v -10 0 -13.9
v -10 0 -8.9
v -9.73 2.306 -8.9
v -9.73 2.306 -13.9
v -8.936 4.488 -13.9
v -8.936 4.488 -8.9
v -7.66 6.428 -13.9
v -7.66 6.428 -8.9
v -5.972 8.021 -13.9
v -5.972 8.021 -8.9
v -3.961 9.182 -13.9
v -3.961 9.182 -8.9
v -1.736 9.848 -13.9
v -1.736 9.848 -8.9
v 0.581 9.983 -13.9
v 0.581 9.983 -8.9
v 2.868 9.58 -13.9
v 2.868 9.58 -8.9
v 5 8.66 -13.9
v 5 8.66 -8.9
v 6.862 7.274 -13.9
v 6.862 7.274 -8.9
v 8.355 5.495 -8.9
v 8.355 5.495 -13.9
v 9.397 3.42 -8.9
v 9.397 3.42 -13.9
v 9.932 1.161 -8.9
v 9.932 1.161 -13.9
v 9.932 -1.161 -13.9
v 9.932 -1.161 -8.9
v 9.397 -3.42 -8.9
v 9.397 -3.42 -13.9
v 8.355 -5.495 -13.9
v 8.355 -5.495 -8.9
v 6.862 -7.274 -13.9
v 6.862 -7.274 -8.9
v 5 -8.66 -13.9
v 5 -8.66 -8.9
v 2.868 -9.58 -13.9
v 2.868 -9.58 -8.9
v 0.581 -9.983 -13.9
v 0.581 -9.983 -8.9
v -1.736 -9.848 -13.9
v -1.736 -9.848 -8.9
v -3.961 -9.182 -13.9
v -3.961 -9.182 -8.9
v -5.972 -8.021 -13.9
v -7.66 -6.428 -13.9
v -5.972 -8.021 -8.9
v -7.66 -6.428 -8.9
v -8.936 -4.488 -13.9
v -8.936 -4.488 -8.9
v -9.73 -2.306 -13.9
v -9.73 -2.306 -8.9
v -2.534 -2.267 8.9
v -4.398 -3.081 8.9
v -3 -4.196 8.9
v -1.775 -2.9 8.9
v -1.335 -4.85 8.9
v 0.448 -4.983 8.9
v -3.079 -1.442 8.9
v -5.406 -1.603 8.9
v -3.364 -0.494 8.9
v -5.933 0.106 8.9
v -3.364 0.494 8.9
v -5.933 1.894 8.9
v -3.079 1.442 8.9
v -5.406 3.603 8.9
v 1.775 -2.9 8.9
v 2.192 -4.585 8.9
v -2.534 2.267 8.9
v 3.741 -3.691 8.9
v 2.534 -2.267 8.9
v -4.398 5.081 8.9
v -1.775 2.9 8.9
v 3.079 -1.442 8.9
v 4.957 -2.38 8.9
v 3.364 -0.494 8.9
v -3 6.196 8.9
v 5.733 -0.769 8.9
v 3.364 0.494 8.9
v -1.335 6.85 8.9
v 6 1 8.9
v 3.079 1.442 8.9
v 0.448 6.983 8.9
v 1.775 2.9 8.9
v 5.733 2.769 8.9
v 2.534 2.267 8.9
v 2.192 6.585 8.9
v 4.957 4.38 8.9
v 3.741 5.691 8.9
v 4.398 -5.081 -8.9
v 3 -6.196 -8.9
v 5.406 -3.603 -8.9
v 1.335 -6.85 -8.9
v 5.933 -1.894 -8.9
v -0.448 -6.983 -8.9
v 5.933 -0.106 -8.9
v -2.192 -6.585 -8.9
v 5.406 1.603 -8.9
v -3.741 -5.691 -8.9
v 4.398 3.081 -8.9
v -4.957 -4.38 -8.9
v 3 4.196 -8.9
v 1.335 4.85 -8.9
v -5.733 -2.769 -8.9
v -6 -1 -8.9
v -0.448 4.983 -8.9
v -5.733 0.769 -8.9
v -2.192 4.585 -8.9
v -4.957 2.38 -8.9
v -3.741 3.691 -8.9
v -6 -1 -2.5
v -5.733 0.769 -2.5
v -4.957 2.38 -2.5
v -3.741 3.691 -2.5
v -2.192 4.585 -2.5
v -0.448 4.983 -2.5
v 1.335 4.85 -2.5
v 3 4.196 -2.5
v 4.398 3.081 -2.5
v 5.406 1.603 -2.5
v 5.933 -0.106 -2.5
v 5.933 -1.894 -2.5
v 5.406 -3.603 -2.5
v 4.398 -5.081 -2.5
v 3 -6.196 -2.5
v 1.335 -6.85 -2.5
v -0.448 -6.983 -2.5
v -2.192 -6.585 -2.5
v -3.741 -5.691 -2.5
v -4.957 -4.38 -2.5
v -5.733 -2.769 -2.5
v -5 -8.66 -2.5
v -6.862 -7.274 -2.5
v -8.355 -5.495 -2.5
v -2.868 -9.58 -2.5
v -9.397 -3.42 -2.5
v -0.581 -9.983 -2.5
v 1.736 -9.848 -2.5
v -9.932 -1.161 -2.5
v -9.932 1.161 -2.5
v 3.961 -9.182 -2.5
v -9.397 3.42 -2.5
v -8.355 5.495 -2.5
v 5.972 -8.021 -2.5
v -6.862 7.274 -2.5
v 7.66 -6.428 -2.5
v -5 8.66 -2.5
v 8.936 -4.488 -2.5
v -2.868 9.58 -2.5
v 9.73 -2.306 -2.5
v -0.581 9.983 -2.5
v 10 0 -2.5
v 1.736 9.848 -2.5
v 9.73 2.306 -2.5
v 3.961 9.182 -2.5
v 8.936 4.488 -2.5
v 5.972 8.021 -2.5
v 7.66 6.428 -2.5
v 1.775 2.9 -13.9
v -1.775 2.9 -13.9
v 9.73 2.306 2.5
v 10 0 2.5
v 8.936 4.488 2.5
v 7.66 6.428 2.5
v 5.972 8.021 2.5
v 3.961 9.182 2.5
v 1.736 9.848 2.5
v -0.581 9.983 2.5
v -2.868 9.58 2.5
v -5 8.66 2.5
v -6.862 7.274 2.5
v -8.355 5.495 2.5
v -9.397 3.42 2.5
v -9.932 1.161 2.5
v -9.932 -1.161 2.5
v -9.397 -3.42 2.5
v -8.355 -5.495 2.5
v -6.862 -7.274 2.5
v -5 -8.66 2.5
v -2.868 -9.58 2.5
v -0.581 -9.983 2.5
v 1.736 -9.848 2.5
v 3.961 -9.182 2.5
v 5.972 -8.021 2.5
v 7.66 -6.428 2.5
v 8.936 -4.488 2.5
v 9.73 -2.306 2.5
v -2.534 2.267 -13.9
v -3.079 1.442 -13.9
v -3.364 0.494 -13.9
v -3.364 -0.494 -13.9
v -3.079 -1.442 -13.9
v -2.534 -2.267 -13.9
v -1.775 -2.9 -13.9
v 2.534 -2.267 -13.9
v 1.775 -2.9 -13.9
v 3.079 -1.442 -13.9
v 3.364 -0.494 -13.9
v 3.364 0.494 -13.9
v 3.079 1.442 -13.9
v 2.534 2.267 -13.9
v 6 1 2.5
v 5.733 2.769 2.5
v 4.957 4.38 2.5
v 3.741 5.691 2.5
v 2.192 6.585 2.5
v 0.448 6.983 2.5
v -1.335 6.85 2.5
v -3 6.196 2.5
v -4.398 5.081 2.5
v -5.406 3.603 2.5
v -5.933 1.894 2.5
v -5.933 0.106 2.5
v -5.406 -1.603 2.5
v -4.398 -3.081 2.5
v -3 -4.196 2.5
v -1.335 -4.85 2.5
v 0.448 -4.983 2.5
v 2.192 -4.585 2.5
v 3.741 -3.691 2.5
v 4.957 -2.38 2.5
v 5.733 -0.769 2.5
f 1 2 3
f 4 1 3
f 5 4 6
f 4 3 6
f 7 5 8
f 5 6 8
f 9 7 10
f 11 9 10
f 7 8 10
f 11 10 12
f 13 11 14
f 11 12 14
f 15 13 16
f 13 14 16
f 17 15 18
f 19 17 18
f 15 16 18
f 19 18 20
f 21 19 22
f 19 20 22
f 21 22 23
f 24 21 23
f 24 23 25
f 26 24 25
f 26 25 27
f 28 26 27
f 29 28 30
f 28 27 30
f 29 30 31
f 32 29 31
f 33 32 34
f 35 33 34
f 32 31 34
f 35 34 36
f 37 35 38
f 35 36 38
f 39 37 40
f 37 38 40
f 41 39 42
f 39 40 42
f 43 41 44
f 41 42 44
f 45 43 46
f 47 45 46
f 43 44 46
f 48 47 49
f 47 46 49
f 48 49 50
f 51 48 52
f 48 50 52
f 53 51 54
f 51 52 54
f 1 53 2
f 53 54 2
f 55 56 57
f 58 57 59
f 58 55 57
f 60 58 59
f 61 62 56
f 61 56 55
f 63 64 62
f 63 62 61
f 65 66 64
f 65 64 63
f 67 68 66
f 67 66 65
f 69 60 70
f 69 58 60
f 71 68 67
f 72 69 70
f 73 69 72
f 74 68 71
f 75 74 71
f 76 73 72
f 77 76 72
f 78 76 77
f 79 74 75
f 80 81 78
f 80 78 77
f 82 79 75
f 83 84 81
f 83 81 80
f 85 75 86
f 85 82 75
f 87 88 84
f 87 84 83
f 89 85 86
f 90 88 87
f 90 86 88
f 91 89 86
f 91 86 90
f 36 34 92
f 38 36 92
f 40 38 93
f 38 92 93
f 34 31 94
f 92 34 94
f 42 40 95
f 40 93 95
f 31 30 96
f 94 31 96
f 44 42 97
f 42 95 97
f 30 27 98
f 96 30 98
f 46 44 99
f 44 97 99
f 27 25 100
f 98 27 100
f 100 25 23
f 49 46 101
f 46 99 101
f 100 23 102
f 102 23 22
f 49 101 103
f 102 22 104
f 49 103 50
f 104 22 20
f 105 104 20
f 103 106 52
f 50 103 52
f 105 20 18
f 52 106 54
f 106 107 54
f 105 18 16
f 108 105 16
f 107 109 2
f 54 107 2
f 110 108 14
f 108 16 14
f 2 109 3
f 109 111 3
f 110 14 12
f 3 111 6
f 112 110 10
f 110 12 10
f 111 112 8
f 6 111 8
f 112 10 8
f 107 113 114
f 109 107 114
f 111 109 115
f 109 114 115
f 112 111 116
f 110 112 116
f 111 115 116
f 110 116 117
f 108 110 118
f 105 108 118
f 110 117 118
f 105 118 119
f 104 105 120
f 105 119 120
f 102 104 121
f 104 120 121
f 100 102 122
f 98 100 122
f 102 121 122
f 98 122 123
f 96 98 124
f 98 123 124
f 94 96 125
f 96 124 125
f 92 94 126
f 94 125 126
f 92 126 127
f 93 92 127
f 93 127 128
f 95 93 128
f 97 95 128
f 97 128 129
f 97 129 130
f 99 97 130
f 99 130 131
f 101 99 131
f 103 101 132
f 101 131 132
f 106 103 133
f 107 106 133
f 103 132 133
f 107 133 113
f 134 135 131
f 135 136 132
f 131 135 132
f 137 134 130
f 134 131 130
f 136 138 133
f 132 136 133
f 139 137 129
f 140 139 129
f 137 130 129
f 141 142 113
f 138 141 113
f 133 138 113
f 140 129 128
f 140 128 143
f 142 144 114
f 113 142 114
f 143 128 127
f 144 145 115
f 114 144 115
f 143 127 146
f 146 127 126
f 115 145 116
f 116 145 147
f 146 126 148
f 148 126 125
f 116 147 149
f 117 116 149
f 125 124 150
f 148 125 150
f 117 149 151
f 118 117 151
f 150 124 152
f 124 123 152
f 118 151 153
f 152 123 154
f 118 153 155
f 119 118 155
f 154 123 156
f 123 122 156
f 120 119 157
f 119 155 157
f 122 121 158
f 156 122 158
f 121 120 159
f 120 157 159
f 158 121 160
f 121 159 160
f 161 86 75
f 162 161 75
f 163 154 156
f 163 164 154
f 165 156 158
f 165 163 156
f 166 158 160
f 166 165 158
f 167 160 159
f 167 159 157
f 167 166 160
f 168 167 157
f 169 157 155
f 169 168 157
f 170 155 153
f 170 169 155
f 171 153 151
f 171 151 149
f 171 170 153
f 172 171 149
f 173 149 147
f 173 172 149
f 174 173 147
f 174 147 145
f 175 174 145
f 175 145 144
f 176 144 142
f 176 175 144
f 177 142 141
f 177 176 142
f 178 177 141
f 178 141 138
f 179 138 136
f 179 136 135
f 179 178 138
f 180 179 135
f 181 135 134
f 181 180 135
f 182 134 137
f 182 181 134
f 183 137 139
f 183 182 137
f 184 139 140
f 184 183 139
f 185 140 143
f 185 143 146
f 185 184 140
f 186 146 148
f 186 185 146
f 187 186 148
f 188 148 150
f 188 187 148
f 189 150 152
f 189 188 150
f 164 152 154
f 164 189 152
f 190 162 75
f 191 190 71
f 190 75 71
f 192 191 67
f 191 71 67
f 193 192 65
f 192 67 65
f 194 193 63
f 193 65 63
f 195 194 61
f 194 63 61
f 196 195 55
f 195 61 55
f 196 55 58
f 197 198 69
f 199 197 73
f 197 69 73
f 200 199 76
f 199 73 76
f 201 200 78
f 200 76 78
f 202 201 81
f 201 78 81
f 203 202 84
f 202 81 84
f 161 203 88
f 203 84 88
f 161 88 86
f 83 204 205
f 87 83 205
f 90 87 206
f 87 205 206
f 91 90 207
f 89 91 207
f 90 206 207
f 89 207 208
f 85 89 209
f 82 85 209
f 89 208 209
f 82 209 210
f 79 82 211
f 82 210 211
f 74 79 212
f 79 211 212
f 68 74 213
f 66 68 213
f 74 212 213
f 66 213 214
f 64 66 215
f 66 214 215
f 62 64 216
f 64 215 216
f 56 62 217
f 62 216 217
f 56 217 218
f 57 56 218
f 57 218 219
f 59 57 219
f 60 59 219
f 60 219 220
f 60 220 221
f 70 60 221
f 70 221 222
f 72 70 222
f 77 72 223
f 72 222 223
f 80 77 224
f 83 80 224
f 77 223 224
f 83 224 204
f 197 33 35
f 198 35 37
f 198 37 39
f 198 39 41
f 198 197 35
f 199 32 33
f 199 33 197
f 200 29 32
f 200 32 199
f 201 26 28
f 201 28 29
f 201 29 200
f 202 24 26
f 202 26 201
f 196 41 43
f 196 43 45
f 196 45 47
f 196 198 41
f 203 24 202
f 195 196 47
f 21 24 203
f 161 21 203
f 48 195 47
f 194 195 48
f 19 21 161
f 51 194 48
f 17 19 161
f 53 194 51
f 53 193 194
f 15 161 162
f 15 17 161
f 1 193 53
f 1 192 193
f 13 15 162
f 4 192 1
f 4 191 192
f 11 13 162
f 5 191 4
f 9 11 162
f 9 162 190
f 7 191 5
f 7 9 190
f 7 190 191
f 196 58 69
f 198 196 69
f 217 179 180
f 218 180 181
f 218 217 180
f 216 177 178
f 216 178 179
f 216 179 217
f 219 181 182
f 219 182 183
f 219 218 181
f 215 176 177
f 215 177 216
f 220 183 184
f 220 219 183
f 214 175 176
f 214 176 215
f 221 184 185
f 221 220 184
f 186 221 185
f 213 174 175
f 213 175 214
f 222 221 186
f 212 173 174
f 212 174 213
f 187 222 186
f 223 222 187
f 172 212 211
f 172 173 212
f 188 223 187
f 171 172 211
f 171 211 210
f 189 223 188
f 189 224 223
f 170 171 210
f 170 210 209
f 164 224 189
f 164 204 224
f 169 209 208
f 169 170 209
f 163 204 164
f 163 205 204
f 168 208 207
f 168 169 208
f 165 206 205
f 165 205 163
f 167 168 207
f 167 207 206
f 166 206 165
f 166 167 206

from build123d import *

# Parameters (mm, degrees)
SKETCH6_R               = 10
BOSS_EXTRUDE4_DEPTH     = 2.5
SKETCH7_R               = 6
BOSS_EXTRUDE5_DEPTH     = 6.4
SKETCH8_R               = 6
BOSS_EXTRUDE6_DEPTH     = 6.4
SKETCH12_R              = 10
BOSS_EXTRUDE8_DEPTH     = 5
CUT_EXTRUDE1_DEPTH      = 7.4
CUT_EXTRUDE1_DEPTH_BACK = 17.4


with BuildPart() as part:
    # Sketch6 → Boss-Extrude4 (new body, symmetric)
    with BuildSketch(Plane.XY):
        Circle(SKETCH6_R)
    extrude(amount=BOSS_EXTRUDE4_DEPTH, both=True)

    # Sketch7 → Boss-Extrude5 (add)
    with BuildSketch(Plane.XY.offset(2.5)):
        with Locations((0, 1)):
            Circle(SKETCH7_R)
    extrude(amount=BOSS_EXTRUDE5_DEPTH)

    # Sketch8 → Boss-Extrude6 (add)
    with BuildSketch(Plane(origin=(0, 0, -2.5), x_dir=(-1, 0, 0), z_dir=(0, 0, -1))):
        with Locations((0, -1)):
            Circle(SKETCH8_R)
    extrude(amount=BOSS_EXTRUDE6_DEPTH)

    # Sketch12 → Boss-Extrude8 (add)
    with BuildSketch(Plane(origin=(0, 0, -8.9), x_dir=(-1, 0, 0), z_dir=(0, 0, -1))):
        Circle(SKETCH12_R)
    extrude(amount=BOSS_EXTRUDE8_DEPTH)

    # Sketch11 → Cut-Extrude1 (cut, two sides)
    with BuildSketch(Plane.XY.offset(2.5)) as cut_extrude1_sk:
        with BuildLine():
            Line((-1.774823935, -2.9), (1.774823935, -2.9))
            ThreePointArc((1.774823935, -2.9), (3.4, 0), (1.774823935, 2.9))
            Line((1.774823935, 2.9), (-1.774823935, 2.9))
            ThreePointArc((-1.774823935, 2.9), (-3.4, 0), (-1.774823935, -2.9))
        make_face()
    extrude(amount=CUT_EXTRUDE1_DEPTH, mode=Mode.SUBTRACT)
    extrude(cut_extrude1_sk.sketch, amount=-CUT_EXTRUDE1_DEPTH_BACK, mode=Mode.SUBTRACT)


solid = part.part
